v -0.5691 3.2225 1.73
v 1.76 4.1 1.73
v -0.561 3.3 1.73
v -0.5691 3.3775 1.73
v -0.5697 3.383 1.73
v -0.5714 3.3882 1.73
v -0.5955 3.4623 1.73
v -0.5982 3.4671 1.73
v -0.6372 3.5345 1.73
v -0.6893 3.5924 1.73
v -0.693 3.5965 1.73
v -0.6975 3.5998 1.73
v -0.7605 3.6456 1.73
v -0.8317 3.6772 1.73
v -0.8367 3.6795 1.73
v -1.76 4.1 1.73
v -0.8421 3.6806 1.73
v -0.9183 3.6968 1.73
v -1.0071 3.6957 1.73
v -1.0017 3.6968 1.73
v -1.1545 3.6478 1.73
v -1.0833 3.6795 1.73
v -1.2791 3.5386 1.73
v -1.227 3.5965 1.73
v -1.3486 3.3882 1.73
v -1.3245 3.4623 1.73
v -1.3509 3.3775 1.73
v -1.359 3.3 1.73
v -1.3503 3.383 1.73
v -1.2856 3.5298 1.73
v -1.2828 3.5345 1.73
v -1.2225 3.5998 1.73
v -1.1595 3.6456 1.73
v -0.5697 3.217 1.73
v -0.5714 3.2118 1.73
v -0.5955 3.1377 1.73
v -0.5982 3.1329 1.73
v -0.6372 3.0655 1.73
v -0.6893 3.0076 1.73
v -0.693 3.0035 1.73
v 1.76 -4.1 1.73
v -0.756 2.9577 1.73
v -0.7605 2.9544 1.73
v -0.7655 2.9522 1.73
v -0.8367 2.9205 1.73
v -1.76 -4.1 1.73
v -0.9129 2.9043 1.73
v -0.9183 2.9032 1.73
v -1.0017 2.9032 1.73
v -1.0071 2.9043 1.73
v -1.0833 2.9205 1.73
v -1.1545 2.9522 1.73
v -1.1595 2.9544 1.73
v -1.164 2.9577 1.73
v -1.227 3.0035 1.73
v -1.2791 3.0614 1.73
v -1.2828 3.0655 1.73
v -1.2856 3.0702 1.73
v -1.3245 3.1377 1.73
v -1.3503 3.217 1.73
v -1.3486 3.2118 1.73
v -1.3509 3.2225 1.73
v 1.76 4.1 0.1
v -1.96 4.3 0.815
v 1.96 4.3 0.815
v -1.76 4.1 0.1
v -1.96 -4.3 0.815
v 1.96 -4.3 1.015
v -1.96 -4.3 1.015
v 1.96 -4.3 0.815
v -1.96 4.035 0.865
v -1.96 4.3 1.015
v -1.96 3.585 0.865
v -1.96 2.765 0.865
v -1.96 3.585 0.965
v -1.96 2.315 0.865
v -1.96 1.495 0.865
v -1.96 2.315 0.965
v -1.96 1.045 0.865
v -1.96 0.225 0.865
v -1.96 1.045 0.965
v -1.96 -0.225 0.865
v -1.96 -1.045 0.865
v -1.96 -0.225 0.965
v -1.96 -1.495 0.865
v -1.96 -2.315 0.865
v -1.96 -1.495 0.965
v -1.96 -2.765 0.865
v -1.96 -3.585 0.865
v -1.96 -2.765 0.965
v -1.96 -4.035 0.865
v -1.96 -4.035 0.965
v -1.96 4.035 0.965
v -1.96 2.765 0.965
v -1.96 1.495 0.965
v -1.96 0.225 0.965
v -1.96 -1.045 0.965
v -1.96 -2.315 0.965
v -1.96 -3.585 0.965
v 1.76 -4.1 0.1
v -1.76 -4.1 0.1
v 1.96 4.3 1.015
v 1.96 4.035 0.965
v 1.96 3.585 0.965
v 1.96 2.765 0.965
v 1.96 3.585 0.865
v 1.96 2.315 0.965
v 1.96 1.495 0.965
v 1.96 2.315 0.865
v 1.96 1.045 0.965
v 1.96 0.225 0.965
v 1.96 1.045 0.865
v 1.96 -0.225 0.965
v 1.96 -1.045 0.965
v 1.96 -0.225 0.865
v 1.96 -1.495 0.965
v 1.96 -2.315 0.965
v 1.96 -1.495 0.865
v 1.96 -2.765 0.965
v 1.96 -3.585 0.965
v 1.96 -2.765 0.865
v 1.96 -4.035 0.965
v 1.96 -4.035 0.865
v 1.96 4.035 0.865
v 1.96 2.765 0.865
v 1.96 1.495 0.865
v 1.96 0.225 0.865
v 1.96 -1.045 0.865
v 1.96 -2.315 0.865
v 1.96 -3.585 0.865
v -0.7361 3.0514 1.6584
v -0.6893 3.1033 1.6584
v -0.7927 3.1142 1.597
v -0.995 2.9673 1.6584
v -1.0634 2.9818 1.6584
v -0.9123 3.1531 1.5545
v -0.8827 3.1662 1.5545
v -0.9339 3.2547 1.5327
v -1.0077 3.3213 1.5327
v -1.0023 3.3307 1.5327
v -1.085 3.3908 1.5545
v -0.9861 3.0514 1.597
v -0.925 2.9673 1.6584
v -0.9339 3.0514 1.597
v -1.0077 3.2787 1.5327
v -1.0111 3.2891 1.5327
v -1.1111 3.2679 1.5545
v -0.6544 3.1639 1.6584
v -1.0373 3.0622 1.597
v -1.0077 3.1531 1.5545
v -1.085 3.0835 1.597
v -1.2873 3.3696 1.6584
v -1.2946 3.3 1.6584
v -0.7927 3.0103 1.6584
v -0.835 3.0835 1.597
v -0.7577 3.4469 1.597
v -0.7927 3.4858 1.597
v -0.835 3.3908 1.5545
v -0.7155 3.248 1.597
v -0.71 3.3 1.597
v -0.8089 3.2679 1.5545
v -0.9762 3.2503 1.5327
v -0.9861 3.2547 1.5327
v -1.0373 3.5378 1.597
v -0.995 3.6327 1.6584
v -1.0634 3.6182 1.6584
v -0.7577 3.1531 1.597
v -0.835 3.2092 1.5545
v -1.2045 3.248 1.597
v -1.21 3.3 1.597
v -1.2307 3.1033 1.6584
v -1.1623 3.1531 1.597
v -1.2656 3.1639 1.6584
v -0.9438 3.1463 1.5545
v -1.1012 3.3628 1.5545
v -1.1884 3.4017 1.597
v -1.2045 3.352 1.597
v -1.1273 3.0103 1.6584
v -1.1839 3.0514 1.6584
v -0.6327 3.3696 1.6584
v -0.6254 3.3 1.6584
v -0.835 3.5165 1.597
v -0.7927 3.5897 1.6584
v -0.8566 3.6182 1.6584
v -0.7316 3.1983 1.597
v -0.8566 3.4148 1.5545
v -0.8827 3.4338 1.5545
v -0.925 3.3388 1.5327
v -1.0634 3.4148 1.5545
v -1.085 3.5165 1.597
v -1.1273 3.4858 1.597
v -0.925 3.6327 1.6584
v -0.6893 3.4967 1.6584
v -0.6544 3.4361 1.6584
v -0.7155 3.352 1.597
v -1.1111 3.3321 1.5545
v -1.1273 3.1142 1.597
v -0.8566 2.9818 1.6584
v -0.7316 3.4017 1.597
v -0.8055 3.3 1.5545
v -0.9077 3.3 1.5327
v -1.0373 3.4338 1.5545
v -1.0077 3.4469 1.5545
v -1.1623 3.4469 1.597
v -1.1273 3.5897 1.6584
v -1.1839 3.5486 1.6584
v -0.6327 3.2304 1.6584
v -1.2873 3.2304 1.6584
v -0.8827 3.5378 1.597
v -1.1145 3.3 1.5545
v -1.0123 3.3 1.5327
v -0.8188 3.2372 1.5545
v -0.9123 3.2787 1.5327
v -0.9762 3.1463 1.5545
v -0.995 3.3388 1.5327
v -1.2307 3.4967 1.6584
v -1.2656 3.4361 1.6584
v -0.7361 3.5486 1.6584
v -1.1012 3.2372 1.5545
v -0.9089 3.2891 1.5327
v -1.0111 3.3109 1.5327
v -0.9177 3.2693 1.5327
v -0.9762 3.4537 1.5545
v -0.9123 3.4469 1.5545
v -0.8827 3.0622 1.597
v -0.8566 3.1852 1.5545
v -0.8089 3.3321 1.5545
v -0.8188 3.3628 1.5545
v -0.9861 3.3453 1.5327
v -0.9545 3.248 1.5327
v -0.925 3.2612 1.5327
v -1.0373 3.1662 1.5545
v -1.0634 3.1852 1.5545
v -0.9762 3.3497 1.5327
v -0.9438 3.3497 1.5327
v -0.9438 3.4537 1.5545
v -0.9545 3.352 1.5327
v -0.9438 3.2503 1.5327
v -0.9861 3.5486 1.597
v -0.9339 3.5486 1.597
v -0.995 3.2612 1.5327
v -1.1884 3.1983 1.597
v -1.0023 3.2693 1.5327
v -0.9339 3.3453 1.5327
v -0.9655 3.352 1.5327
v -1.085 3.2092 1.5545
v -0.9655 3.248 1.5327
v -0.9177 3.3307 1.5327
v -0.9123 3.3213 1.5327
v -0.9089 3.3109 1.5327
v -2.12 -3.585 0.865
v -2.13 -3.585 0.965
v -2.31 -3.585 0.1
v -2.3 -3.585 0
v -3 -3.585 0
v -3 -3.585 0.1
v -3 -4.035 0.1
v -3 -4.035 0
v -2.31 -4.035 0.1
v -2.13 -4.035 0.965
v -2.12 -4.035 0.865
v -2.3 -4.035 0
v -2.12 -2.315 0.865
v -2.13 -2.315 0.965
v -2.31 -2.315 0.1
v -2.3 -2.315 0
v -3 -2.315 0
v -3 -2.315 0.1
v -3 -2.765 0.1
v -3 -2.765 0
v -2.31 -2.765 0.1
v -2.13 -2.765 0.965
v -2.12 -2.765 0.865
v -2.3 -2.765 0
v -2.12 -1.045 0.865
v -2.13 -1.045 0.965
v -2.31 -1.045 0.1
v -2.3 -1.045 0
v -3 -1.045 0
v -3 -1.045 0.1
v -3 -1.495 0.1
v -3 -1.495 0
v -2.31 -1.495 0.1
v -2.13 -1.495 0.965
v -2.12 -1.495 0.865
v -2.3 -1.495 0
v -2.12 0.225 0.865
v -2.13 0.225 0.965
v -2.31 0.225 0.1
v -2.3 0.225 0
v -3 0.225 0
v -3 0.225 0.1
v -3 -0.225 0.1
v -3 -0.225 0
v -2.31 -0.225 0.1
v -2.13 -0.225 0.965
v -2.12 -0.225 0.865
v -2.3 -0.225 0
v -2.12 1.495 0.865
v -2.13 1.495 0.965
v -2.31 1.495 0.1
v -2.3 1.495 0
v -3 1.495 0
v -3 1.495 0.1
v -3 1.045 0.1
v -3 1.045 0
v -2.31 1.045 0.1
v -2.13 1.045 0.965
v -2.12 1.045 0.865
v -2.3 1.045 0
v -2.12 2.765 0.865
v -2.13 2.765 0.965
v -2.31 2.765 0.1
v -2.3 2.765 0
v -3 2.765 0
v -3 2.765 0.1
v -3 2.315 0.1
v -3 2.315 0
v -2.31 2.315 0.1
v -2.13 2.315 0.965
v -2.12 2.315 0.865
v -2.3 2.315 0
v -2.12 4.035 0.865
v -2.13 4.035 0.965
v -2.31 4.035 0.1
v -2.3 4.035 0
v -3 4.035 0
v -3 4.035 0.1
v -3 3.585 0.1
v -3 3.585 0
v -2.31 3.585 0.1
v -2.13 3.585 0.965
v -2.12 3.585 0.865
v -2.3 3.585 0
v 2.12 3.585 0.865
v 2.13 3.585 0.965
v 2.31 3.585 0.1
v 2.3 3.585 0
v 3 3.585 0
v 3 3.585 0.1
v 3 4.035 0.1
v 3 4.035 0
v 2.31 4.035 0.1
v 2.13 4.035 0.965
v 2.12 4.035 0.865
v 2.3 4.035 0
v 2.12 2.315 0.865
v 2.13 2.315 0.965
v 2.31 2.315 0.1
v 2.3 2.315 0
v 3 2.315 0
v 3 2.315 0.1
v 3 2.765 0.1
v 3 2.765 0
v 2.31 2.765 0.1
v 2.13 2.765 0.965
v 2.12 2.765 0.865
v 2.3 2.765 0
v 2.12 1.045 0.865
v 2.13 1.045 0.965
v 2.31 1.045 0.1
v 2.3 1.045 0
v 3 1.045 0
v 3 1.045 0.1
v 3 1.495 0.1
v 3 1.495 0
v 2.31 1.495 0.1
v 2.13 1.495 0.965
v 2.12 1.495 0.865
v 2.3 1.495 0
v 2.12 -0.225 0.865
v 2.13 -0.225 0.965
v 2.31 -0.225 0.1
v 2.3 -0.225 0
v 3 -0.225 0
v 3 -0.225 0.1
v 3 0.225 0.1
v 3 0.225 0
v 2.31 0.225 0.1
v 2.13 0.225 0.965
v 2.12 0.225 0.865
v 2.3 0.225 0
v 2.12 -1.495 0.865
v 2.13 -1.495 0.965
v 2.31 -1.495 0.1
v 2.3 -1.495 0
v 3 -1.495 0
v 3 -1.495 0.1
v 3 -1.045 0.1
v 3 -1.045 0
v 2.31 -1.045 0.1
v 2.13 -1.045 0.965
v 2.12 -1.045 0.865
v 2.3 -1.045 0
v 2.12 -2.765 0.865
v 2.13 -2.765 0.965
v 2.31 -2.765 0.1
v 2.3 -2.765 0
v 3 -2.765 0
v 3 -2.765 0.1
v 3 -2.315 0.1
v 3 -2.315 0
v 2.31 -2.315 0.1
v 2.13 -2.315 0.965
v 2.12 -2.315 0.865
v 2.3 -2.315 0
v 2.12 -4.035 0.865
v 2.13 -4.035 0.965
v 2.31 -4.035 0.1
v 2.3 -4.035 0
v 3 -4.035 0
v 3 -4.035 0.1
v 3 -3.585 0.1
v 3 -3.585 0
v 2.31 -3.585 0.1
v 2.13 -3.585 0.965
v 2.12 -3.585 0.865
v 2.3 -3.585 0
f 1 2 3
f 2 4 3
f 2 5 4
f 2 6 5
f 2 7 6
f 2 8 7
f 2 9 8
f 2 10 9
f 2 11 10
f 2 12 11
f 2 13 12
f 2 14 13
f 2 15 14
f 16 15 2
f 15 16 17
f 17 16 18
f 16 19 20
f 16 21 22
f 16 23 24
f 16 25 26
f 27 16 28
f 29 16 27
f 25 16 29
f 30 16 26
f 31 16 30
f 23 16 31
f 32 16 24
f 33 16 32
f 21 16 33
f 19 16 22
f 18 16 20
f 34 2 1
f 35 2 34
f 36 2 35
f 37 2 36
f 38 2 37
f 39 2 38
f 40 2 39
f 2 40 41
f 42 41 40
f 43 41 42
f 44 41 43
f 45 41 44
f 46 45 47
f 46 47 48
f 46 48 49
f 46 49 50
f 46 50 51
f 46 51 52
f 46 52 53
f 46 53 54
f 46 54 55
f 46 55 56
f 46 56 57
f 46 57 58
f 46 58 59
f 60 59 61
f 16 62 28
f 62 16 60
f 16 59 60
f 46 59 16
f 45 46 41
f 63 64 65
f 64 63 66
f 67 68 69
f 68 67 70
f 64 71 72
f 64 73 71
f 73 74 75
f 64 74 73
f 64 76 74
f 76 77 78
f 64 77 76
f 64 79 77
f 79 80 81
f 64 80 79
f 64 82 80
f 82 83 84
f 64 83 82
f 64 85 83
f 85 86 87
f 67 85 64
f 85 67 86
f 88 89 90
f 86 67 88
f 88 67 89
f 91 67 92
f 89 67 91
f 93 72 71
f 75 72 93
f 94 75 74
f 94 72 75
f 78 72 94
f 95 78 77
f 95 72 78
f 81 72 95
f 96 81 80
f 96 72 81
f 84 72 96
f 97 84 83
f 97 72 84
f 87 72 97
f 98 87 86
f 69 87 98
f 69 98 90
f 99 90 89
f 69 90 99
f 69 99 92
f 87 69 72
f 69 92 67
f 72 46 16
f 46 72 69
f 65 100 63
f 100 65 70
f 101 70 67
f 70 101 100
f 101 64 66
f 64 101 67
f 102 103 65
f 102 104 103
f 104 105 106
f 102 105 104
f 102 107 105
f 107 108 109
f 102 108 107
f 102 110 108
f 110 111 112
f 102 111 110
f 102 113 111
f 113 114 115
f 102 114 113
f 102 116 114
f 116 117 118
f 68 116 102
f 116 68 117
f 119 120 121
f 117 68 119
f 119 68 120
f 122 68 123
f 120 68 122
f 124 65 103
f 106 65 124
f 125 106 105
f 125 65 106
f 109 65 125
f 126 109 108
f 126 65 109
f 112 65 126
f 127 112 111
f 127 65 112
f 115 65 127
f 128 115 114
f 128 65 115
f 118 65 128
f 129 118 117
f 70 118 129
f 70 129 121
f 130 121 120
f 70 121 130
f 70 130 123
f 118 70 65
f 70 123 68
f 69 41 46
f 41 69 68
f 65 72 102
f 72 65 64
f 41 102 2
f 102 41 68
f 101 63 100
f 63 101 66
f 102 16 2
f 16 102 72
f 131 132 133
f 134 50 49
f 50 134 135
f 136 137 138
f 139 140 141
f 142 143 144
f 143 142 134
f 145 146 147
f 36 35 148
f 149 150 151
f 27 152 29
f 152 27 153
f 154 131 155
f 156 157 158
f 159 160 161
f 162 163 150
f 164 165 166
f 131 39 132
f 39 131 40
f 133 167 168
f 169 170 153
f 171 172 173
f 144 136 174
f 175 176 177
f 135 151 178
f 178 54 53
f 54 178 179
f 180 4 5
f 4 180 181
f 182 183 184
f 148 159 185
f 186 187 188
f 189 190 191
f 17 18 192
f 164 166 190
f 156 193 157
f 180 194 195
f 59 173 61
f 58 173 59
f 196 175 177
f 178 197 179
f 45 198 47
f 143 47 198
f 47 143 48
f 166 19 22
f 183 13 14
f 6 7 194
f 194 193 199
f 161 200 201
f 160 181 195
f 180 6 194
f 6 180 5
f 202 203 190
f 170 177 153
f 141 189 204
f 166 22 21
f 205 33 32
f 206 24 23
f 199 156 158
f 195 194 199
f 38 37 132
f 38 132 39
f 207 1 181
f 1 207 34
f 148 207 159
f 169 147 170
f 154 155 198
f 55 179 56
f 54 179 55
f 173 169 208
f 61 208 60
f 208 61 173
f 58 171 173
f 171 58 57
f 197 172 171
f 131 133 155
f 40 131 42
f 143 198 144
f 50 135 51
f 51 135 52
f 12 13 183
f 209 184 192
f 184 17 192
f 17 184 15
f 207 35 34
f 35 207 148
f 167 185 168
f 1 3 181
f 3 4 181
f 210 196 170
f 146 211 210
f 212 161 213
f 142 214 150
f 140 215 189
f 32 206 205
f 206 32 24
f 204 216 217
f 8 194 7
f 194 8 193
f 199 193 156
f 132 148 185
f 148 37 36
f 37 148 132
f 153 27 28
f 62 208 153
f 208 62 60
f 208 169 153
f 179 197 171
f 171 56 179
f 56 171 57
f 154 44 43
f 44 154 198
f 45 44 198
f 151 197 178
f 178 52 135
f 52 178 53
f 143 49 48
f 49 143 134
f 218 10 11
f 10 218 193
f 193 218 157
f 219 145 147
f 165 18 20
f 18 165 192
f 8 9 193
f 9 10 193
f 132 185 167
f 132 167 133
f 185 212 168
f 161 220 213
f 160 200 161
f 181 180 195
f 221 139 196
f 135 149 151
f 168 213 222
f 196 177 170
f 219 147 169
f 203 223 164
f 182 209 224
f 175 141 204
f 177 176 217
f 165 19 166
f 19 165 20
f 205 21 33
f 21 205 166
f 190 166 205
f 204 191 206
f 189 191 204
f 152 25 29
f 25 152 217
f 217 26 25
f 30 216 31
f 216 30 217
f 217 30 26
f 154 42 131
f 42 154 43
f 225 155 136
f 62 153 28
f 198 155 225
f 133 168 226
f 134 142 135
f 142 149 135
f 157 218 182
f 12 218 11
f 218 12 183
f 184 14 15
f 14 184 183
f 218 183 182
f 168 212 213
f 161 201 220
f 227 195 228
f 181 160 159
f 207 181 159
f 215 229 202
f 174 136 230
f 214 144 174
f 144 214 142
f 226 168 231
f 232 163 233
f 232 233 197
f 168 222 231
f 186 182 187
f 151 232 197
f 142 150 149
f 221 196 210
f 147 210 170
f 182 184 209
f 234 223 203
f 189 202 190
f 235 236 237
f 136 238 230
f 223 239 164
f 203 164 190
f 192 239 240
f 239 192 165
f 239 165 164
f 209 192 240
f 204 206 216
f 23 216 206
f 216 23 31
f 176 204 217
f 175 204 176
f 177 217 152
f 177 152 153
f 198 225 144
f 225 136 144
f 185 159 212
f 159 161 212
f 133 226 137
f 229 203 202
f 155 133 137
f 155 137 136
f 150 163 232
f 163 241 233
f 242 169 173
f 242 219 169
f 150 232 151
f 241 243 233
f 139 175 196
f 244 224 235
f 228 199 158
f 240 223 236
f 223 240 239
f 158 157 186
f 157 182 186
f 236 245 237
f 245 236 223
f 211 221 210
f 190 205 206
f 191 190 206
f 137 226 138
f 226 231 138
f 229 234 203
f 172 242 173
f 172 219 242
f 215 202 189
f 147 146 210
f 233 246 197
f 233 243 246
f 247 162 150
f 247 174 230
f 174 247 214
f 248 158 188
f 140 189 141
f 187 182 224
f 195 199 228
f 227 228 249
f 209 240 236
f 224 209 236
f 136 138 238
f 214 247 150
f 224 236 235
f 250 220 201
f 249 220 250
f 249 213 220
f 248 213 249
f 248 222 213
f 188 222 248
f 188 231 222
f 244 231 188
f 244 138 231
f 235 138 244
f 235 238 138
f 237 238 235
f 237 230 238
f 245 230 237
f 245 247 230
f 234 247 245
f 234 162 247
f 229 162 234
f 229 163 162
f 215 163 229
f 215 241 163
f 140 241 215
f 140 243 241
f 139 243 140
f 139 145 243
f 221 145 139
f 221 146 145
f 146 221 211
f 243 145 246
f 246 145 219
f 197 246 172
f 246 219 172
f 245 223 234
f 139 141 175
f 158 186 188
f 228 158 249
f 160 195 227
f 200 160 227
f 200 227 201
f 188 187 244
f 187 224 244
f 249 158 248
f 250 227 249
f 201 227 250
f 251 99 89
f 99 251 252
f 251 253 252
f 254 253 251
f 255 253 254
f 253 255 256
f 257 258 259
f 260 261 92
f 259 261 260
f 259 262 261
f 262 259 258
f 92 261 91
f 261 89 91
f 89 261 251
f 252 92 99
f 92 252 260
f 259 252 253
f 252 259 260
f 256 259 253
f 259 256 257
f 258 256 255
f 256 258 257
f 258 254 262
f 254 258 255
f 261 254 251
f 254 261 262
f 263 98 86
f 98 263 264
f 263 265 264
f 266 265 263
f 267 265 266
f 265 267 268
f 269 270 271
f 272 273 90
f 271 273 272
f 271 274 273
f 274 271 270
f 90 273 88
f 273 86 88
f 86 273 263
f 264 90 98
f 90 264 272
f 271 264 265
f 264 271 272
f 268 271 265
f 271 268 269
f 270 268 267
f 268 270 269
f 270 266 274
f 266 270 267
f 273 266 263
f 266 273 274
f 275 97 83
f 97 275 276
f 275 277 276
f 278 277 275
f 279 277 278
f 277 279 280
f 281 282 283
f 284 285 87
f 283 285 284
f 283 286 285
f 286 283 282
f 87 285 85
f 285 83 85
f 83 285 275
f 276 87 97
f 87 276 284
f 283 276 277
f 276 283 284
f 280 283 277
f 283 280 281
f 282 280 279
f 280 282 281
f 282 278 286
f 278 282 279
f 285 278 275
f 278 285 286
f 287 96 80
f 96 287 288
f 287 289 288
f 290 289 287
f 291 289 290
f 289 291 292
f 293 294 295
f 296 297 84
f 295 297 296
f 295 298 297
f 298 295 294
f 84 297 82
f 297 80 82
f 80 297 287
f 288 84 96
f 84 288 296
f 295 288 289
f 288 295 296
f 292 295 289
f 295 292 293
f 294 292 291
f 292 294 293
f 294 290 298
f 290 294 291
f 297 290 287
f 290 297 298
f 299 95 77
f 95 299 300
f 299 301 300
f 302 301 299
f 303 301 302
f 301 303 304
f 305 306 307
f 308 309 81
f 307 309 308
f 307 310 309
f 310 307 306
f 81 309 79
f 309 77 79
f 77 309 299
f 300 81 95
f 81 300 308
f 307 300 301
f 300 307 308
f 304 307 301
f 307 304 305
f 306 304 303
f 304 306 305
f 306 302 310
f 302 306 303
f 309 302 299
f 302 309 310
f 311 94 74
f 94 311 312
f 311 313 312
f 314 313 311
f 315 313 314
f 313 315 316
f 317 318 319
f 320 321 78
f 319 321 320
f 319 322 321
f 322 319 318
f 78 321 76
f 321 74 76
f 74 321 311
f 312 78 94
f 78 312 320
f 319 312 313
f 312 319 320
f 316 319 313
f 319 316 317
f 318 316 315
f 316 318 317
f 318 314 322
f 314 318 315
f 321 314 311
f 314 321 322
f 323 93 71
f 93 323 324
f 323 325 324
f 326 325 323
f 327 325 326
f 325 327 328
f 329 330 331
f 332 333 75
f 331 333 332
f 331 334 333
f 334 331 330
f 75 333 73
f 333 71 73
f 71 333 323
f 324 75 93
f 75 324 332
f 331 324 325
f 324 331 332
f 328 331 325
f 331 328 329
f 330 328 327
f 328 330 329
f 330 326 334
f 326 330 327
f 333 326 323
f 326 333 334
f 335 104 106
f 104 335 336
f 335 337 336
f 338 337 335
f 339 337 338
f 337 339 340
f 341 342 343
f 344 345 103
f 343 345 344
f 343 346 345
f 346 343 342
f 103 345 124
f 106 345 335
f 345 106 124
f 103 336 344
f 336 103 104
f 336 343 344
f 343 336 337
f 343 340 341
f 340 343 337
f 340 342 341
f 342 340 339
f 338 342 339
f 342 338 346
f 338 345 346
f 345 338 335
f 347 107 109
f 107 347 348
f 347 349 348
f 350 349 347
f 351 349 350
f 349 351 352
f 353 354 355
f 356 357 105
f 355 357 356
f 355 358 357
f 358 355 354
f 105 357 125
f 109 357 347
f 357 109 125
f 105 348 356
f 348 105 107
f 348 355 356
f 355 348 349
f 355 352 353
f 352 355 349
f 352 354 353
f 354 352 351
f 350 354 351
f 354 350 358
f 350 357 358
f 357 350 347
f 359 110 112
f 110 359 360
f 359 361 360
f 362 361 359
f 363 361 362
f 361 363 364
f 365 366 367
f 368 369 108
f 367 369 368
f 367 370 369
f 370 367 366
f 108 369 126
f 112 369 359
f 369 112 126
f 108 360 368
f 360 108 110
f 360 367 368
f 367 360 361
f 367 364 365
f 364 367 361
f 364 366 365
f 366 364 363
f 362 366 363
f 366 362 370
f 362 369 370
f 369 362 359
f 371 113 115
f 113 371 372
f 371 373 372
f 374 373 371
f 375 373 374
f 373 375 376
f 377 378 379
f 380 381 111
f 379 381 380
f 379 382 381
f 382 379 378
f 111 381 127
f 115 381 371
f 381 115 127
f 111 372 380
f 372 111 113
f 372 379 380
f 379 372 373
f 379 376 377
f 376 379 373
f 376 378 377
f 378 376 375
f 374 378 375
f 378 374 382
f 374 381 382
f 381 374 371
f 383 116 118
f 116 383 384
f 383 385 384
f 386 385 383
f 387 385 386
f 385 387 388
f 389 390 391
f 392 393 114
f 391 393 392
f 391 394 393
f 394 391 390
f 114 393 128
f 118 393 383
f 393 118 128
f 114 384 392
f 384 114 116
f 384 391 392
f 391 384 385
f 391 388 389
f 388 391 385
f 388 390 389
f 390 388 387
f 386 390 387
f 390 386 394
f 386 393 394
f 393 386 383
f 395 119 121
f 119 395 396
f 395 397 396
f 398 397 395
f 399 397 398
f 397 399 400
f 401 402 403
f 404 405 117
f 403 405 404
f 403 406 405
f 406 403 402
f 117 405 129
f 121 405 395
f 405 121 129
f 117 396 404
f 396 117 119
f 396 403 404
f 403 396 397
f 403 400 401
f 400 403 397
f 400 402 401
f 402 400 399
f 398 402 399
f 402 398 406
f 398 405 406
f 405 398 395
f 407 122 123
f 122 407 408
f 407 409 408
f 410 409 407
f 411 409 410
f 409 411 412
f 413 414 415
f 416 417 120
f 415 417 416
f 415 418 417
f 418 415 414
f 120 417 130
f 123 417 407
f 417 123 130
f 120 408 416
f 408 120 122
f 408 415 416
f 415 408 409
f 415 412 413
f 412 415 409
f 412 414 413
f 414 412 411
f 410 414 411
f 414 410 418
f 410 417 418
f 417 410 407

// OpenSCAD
// file: proto/soic.scad
/*
OpenSCAD Model:  Small Outline IC

  N  - number of pins
  L  - width, including pads
  P  - pitch
  W  - width of pad
  H  - total height
  T  - toe length
  A  - body width
  B  - body height
  K  - elevation
  padcolor - color of pads
  bodycolor - color of plastic body
  simple - 0 = realistic model, 1 = simplified model

*/

module soic(
	N=14,
	L=6.4,
	P=0.65,
	W=0.25,
	H=1.2,
	T=0.624,
	A=4.4,
	B=5,
	K=0.1,
	padcolor=[0.9,0.9,0.9],
	bodycolor=[0.2,0.2,0.2],
	simple=0
) {

	module soicpadblock(n)	{
		x=0.01;
		color(padcolor) for (i=[0:n-1]) {
			translate ([0,-(n-1)/2*P+i*P+W/2,0])  rotate(90,[1,0,0]) linear_extrude(height=W) polygon(
				[[0,0],[0,0.1],[T-x,0.1],[T+((L-A)/2-T)/2,(H-K)/2+0.05+K],[(L-A)/2+0.05,(H-K)/2+0.05+K],
				 [(L-A)/2+0.05,(H-K)/2-0.05+K],[T+((L-A)/2-T)/2+x,(H-K)/2-0.05+K],[T,0]]
			);
		}
	}

	color(bodycolor) {
		translate([0,0,(H-K)/2+K]) {
			difference() {
			if (simple) {
				cube([A,B,H-K],center=true);
			} else {
				polyhedron(
					[[-A/2+0.2,B/2-0.2,(H-K)/2],[A/2-0.2,B/2-0.2,(H-K)/2],[A/2-0.2,-B/2+0.2,(H-K)/2],[-A/2+0.2,-B/2+0.2,(H-K)/2],
					 [-A/2,B/2,0.1],[A/2,B/2,0.1],[A/2,-B/2,0.1],[-A/2,-B/2,0.1],
					 [-A/2,B/2,-0.1],[A/2,B/2,-0.1],[A/2,-B/2,-0.1],[-A/2,-B/2,-0.1],
					 [-A/2+0.2,B/2-0.2,-(H-K)/2],[A/2-0.2,B/2-0.2,-(H-K)/2],[A/2-0.2,-B/2+0.2,-(H-K)/2],[-A/2+0.2,-B/2+0.2,-(H-K)/2]],
					[
					[0,1,2],[2,3,0],[14,13,12],[12,15,14],
					[0,4,5],[5,1,0],[1,5,6],[6,2,1],[2,6,7],[7,3,2],[3,7,4],[4,0,3],
					[4,8,9],[9,5,4],[5,9,10],[10,6,5],[6,10,11],[11,7,6],[11,8,4],[4,7,11],
					[8,12,13],[13,9,8],[9,13,14],[14,10,9],[10,14,15],[15,11,10],[11,15,12],[12,8,11],
					]
				);
			}
			translate([-A/2+1,B/2-1,(H-K)/2+0.3]) sphere(r=0.5,$fn=30);
			}
		}
	}

	translate([-L/2,0,0]) soicpadblock(N/2);
	translate([L/2,0,0]) rotate(180,[0,0,1]) soicpadblock(N/2);
}
// main file
include <proto/soic.scad>

soic(
	N=14,
	L=6.0,
	P=1.27,
	W=0.45,
	H=1.73,
	T=0.7,
	A=3.92,
	B=8.6,
	K=0.1
);
